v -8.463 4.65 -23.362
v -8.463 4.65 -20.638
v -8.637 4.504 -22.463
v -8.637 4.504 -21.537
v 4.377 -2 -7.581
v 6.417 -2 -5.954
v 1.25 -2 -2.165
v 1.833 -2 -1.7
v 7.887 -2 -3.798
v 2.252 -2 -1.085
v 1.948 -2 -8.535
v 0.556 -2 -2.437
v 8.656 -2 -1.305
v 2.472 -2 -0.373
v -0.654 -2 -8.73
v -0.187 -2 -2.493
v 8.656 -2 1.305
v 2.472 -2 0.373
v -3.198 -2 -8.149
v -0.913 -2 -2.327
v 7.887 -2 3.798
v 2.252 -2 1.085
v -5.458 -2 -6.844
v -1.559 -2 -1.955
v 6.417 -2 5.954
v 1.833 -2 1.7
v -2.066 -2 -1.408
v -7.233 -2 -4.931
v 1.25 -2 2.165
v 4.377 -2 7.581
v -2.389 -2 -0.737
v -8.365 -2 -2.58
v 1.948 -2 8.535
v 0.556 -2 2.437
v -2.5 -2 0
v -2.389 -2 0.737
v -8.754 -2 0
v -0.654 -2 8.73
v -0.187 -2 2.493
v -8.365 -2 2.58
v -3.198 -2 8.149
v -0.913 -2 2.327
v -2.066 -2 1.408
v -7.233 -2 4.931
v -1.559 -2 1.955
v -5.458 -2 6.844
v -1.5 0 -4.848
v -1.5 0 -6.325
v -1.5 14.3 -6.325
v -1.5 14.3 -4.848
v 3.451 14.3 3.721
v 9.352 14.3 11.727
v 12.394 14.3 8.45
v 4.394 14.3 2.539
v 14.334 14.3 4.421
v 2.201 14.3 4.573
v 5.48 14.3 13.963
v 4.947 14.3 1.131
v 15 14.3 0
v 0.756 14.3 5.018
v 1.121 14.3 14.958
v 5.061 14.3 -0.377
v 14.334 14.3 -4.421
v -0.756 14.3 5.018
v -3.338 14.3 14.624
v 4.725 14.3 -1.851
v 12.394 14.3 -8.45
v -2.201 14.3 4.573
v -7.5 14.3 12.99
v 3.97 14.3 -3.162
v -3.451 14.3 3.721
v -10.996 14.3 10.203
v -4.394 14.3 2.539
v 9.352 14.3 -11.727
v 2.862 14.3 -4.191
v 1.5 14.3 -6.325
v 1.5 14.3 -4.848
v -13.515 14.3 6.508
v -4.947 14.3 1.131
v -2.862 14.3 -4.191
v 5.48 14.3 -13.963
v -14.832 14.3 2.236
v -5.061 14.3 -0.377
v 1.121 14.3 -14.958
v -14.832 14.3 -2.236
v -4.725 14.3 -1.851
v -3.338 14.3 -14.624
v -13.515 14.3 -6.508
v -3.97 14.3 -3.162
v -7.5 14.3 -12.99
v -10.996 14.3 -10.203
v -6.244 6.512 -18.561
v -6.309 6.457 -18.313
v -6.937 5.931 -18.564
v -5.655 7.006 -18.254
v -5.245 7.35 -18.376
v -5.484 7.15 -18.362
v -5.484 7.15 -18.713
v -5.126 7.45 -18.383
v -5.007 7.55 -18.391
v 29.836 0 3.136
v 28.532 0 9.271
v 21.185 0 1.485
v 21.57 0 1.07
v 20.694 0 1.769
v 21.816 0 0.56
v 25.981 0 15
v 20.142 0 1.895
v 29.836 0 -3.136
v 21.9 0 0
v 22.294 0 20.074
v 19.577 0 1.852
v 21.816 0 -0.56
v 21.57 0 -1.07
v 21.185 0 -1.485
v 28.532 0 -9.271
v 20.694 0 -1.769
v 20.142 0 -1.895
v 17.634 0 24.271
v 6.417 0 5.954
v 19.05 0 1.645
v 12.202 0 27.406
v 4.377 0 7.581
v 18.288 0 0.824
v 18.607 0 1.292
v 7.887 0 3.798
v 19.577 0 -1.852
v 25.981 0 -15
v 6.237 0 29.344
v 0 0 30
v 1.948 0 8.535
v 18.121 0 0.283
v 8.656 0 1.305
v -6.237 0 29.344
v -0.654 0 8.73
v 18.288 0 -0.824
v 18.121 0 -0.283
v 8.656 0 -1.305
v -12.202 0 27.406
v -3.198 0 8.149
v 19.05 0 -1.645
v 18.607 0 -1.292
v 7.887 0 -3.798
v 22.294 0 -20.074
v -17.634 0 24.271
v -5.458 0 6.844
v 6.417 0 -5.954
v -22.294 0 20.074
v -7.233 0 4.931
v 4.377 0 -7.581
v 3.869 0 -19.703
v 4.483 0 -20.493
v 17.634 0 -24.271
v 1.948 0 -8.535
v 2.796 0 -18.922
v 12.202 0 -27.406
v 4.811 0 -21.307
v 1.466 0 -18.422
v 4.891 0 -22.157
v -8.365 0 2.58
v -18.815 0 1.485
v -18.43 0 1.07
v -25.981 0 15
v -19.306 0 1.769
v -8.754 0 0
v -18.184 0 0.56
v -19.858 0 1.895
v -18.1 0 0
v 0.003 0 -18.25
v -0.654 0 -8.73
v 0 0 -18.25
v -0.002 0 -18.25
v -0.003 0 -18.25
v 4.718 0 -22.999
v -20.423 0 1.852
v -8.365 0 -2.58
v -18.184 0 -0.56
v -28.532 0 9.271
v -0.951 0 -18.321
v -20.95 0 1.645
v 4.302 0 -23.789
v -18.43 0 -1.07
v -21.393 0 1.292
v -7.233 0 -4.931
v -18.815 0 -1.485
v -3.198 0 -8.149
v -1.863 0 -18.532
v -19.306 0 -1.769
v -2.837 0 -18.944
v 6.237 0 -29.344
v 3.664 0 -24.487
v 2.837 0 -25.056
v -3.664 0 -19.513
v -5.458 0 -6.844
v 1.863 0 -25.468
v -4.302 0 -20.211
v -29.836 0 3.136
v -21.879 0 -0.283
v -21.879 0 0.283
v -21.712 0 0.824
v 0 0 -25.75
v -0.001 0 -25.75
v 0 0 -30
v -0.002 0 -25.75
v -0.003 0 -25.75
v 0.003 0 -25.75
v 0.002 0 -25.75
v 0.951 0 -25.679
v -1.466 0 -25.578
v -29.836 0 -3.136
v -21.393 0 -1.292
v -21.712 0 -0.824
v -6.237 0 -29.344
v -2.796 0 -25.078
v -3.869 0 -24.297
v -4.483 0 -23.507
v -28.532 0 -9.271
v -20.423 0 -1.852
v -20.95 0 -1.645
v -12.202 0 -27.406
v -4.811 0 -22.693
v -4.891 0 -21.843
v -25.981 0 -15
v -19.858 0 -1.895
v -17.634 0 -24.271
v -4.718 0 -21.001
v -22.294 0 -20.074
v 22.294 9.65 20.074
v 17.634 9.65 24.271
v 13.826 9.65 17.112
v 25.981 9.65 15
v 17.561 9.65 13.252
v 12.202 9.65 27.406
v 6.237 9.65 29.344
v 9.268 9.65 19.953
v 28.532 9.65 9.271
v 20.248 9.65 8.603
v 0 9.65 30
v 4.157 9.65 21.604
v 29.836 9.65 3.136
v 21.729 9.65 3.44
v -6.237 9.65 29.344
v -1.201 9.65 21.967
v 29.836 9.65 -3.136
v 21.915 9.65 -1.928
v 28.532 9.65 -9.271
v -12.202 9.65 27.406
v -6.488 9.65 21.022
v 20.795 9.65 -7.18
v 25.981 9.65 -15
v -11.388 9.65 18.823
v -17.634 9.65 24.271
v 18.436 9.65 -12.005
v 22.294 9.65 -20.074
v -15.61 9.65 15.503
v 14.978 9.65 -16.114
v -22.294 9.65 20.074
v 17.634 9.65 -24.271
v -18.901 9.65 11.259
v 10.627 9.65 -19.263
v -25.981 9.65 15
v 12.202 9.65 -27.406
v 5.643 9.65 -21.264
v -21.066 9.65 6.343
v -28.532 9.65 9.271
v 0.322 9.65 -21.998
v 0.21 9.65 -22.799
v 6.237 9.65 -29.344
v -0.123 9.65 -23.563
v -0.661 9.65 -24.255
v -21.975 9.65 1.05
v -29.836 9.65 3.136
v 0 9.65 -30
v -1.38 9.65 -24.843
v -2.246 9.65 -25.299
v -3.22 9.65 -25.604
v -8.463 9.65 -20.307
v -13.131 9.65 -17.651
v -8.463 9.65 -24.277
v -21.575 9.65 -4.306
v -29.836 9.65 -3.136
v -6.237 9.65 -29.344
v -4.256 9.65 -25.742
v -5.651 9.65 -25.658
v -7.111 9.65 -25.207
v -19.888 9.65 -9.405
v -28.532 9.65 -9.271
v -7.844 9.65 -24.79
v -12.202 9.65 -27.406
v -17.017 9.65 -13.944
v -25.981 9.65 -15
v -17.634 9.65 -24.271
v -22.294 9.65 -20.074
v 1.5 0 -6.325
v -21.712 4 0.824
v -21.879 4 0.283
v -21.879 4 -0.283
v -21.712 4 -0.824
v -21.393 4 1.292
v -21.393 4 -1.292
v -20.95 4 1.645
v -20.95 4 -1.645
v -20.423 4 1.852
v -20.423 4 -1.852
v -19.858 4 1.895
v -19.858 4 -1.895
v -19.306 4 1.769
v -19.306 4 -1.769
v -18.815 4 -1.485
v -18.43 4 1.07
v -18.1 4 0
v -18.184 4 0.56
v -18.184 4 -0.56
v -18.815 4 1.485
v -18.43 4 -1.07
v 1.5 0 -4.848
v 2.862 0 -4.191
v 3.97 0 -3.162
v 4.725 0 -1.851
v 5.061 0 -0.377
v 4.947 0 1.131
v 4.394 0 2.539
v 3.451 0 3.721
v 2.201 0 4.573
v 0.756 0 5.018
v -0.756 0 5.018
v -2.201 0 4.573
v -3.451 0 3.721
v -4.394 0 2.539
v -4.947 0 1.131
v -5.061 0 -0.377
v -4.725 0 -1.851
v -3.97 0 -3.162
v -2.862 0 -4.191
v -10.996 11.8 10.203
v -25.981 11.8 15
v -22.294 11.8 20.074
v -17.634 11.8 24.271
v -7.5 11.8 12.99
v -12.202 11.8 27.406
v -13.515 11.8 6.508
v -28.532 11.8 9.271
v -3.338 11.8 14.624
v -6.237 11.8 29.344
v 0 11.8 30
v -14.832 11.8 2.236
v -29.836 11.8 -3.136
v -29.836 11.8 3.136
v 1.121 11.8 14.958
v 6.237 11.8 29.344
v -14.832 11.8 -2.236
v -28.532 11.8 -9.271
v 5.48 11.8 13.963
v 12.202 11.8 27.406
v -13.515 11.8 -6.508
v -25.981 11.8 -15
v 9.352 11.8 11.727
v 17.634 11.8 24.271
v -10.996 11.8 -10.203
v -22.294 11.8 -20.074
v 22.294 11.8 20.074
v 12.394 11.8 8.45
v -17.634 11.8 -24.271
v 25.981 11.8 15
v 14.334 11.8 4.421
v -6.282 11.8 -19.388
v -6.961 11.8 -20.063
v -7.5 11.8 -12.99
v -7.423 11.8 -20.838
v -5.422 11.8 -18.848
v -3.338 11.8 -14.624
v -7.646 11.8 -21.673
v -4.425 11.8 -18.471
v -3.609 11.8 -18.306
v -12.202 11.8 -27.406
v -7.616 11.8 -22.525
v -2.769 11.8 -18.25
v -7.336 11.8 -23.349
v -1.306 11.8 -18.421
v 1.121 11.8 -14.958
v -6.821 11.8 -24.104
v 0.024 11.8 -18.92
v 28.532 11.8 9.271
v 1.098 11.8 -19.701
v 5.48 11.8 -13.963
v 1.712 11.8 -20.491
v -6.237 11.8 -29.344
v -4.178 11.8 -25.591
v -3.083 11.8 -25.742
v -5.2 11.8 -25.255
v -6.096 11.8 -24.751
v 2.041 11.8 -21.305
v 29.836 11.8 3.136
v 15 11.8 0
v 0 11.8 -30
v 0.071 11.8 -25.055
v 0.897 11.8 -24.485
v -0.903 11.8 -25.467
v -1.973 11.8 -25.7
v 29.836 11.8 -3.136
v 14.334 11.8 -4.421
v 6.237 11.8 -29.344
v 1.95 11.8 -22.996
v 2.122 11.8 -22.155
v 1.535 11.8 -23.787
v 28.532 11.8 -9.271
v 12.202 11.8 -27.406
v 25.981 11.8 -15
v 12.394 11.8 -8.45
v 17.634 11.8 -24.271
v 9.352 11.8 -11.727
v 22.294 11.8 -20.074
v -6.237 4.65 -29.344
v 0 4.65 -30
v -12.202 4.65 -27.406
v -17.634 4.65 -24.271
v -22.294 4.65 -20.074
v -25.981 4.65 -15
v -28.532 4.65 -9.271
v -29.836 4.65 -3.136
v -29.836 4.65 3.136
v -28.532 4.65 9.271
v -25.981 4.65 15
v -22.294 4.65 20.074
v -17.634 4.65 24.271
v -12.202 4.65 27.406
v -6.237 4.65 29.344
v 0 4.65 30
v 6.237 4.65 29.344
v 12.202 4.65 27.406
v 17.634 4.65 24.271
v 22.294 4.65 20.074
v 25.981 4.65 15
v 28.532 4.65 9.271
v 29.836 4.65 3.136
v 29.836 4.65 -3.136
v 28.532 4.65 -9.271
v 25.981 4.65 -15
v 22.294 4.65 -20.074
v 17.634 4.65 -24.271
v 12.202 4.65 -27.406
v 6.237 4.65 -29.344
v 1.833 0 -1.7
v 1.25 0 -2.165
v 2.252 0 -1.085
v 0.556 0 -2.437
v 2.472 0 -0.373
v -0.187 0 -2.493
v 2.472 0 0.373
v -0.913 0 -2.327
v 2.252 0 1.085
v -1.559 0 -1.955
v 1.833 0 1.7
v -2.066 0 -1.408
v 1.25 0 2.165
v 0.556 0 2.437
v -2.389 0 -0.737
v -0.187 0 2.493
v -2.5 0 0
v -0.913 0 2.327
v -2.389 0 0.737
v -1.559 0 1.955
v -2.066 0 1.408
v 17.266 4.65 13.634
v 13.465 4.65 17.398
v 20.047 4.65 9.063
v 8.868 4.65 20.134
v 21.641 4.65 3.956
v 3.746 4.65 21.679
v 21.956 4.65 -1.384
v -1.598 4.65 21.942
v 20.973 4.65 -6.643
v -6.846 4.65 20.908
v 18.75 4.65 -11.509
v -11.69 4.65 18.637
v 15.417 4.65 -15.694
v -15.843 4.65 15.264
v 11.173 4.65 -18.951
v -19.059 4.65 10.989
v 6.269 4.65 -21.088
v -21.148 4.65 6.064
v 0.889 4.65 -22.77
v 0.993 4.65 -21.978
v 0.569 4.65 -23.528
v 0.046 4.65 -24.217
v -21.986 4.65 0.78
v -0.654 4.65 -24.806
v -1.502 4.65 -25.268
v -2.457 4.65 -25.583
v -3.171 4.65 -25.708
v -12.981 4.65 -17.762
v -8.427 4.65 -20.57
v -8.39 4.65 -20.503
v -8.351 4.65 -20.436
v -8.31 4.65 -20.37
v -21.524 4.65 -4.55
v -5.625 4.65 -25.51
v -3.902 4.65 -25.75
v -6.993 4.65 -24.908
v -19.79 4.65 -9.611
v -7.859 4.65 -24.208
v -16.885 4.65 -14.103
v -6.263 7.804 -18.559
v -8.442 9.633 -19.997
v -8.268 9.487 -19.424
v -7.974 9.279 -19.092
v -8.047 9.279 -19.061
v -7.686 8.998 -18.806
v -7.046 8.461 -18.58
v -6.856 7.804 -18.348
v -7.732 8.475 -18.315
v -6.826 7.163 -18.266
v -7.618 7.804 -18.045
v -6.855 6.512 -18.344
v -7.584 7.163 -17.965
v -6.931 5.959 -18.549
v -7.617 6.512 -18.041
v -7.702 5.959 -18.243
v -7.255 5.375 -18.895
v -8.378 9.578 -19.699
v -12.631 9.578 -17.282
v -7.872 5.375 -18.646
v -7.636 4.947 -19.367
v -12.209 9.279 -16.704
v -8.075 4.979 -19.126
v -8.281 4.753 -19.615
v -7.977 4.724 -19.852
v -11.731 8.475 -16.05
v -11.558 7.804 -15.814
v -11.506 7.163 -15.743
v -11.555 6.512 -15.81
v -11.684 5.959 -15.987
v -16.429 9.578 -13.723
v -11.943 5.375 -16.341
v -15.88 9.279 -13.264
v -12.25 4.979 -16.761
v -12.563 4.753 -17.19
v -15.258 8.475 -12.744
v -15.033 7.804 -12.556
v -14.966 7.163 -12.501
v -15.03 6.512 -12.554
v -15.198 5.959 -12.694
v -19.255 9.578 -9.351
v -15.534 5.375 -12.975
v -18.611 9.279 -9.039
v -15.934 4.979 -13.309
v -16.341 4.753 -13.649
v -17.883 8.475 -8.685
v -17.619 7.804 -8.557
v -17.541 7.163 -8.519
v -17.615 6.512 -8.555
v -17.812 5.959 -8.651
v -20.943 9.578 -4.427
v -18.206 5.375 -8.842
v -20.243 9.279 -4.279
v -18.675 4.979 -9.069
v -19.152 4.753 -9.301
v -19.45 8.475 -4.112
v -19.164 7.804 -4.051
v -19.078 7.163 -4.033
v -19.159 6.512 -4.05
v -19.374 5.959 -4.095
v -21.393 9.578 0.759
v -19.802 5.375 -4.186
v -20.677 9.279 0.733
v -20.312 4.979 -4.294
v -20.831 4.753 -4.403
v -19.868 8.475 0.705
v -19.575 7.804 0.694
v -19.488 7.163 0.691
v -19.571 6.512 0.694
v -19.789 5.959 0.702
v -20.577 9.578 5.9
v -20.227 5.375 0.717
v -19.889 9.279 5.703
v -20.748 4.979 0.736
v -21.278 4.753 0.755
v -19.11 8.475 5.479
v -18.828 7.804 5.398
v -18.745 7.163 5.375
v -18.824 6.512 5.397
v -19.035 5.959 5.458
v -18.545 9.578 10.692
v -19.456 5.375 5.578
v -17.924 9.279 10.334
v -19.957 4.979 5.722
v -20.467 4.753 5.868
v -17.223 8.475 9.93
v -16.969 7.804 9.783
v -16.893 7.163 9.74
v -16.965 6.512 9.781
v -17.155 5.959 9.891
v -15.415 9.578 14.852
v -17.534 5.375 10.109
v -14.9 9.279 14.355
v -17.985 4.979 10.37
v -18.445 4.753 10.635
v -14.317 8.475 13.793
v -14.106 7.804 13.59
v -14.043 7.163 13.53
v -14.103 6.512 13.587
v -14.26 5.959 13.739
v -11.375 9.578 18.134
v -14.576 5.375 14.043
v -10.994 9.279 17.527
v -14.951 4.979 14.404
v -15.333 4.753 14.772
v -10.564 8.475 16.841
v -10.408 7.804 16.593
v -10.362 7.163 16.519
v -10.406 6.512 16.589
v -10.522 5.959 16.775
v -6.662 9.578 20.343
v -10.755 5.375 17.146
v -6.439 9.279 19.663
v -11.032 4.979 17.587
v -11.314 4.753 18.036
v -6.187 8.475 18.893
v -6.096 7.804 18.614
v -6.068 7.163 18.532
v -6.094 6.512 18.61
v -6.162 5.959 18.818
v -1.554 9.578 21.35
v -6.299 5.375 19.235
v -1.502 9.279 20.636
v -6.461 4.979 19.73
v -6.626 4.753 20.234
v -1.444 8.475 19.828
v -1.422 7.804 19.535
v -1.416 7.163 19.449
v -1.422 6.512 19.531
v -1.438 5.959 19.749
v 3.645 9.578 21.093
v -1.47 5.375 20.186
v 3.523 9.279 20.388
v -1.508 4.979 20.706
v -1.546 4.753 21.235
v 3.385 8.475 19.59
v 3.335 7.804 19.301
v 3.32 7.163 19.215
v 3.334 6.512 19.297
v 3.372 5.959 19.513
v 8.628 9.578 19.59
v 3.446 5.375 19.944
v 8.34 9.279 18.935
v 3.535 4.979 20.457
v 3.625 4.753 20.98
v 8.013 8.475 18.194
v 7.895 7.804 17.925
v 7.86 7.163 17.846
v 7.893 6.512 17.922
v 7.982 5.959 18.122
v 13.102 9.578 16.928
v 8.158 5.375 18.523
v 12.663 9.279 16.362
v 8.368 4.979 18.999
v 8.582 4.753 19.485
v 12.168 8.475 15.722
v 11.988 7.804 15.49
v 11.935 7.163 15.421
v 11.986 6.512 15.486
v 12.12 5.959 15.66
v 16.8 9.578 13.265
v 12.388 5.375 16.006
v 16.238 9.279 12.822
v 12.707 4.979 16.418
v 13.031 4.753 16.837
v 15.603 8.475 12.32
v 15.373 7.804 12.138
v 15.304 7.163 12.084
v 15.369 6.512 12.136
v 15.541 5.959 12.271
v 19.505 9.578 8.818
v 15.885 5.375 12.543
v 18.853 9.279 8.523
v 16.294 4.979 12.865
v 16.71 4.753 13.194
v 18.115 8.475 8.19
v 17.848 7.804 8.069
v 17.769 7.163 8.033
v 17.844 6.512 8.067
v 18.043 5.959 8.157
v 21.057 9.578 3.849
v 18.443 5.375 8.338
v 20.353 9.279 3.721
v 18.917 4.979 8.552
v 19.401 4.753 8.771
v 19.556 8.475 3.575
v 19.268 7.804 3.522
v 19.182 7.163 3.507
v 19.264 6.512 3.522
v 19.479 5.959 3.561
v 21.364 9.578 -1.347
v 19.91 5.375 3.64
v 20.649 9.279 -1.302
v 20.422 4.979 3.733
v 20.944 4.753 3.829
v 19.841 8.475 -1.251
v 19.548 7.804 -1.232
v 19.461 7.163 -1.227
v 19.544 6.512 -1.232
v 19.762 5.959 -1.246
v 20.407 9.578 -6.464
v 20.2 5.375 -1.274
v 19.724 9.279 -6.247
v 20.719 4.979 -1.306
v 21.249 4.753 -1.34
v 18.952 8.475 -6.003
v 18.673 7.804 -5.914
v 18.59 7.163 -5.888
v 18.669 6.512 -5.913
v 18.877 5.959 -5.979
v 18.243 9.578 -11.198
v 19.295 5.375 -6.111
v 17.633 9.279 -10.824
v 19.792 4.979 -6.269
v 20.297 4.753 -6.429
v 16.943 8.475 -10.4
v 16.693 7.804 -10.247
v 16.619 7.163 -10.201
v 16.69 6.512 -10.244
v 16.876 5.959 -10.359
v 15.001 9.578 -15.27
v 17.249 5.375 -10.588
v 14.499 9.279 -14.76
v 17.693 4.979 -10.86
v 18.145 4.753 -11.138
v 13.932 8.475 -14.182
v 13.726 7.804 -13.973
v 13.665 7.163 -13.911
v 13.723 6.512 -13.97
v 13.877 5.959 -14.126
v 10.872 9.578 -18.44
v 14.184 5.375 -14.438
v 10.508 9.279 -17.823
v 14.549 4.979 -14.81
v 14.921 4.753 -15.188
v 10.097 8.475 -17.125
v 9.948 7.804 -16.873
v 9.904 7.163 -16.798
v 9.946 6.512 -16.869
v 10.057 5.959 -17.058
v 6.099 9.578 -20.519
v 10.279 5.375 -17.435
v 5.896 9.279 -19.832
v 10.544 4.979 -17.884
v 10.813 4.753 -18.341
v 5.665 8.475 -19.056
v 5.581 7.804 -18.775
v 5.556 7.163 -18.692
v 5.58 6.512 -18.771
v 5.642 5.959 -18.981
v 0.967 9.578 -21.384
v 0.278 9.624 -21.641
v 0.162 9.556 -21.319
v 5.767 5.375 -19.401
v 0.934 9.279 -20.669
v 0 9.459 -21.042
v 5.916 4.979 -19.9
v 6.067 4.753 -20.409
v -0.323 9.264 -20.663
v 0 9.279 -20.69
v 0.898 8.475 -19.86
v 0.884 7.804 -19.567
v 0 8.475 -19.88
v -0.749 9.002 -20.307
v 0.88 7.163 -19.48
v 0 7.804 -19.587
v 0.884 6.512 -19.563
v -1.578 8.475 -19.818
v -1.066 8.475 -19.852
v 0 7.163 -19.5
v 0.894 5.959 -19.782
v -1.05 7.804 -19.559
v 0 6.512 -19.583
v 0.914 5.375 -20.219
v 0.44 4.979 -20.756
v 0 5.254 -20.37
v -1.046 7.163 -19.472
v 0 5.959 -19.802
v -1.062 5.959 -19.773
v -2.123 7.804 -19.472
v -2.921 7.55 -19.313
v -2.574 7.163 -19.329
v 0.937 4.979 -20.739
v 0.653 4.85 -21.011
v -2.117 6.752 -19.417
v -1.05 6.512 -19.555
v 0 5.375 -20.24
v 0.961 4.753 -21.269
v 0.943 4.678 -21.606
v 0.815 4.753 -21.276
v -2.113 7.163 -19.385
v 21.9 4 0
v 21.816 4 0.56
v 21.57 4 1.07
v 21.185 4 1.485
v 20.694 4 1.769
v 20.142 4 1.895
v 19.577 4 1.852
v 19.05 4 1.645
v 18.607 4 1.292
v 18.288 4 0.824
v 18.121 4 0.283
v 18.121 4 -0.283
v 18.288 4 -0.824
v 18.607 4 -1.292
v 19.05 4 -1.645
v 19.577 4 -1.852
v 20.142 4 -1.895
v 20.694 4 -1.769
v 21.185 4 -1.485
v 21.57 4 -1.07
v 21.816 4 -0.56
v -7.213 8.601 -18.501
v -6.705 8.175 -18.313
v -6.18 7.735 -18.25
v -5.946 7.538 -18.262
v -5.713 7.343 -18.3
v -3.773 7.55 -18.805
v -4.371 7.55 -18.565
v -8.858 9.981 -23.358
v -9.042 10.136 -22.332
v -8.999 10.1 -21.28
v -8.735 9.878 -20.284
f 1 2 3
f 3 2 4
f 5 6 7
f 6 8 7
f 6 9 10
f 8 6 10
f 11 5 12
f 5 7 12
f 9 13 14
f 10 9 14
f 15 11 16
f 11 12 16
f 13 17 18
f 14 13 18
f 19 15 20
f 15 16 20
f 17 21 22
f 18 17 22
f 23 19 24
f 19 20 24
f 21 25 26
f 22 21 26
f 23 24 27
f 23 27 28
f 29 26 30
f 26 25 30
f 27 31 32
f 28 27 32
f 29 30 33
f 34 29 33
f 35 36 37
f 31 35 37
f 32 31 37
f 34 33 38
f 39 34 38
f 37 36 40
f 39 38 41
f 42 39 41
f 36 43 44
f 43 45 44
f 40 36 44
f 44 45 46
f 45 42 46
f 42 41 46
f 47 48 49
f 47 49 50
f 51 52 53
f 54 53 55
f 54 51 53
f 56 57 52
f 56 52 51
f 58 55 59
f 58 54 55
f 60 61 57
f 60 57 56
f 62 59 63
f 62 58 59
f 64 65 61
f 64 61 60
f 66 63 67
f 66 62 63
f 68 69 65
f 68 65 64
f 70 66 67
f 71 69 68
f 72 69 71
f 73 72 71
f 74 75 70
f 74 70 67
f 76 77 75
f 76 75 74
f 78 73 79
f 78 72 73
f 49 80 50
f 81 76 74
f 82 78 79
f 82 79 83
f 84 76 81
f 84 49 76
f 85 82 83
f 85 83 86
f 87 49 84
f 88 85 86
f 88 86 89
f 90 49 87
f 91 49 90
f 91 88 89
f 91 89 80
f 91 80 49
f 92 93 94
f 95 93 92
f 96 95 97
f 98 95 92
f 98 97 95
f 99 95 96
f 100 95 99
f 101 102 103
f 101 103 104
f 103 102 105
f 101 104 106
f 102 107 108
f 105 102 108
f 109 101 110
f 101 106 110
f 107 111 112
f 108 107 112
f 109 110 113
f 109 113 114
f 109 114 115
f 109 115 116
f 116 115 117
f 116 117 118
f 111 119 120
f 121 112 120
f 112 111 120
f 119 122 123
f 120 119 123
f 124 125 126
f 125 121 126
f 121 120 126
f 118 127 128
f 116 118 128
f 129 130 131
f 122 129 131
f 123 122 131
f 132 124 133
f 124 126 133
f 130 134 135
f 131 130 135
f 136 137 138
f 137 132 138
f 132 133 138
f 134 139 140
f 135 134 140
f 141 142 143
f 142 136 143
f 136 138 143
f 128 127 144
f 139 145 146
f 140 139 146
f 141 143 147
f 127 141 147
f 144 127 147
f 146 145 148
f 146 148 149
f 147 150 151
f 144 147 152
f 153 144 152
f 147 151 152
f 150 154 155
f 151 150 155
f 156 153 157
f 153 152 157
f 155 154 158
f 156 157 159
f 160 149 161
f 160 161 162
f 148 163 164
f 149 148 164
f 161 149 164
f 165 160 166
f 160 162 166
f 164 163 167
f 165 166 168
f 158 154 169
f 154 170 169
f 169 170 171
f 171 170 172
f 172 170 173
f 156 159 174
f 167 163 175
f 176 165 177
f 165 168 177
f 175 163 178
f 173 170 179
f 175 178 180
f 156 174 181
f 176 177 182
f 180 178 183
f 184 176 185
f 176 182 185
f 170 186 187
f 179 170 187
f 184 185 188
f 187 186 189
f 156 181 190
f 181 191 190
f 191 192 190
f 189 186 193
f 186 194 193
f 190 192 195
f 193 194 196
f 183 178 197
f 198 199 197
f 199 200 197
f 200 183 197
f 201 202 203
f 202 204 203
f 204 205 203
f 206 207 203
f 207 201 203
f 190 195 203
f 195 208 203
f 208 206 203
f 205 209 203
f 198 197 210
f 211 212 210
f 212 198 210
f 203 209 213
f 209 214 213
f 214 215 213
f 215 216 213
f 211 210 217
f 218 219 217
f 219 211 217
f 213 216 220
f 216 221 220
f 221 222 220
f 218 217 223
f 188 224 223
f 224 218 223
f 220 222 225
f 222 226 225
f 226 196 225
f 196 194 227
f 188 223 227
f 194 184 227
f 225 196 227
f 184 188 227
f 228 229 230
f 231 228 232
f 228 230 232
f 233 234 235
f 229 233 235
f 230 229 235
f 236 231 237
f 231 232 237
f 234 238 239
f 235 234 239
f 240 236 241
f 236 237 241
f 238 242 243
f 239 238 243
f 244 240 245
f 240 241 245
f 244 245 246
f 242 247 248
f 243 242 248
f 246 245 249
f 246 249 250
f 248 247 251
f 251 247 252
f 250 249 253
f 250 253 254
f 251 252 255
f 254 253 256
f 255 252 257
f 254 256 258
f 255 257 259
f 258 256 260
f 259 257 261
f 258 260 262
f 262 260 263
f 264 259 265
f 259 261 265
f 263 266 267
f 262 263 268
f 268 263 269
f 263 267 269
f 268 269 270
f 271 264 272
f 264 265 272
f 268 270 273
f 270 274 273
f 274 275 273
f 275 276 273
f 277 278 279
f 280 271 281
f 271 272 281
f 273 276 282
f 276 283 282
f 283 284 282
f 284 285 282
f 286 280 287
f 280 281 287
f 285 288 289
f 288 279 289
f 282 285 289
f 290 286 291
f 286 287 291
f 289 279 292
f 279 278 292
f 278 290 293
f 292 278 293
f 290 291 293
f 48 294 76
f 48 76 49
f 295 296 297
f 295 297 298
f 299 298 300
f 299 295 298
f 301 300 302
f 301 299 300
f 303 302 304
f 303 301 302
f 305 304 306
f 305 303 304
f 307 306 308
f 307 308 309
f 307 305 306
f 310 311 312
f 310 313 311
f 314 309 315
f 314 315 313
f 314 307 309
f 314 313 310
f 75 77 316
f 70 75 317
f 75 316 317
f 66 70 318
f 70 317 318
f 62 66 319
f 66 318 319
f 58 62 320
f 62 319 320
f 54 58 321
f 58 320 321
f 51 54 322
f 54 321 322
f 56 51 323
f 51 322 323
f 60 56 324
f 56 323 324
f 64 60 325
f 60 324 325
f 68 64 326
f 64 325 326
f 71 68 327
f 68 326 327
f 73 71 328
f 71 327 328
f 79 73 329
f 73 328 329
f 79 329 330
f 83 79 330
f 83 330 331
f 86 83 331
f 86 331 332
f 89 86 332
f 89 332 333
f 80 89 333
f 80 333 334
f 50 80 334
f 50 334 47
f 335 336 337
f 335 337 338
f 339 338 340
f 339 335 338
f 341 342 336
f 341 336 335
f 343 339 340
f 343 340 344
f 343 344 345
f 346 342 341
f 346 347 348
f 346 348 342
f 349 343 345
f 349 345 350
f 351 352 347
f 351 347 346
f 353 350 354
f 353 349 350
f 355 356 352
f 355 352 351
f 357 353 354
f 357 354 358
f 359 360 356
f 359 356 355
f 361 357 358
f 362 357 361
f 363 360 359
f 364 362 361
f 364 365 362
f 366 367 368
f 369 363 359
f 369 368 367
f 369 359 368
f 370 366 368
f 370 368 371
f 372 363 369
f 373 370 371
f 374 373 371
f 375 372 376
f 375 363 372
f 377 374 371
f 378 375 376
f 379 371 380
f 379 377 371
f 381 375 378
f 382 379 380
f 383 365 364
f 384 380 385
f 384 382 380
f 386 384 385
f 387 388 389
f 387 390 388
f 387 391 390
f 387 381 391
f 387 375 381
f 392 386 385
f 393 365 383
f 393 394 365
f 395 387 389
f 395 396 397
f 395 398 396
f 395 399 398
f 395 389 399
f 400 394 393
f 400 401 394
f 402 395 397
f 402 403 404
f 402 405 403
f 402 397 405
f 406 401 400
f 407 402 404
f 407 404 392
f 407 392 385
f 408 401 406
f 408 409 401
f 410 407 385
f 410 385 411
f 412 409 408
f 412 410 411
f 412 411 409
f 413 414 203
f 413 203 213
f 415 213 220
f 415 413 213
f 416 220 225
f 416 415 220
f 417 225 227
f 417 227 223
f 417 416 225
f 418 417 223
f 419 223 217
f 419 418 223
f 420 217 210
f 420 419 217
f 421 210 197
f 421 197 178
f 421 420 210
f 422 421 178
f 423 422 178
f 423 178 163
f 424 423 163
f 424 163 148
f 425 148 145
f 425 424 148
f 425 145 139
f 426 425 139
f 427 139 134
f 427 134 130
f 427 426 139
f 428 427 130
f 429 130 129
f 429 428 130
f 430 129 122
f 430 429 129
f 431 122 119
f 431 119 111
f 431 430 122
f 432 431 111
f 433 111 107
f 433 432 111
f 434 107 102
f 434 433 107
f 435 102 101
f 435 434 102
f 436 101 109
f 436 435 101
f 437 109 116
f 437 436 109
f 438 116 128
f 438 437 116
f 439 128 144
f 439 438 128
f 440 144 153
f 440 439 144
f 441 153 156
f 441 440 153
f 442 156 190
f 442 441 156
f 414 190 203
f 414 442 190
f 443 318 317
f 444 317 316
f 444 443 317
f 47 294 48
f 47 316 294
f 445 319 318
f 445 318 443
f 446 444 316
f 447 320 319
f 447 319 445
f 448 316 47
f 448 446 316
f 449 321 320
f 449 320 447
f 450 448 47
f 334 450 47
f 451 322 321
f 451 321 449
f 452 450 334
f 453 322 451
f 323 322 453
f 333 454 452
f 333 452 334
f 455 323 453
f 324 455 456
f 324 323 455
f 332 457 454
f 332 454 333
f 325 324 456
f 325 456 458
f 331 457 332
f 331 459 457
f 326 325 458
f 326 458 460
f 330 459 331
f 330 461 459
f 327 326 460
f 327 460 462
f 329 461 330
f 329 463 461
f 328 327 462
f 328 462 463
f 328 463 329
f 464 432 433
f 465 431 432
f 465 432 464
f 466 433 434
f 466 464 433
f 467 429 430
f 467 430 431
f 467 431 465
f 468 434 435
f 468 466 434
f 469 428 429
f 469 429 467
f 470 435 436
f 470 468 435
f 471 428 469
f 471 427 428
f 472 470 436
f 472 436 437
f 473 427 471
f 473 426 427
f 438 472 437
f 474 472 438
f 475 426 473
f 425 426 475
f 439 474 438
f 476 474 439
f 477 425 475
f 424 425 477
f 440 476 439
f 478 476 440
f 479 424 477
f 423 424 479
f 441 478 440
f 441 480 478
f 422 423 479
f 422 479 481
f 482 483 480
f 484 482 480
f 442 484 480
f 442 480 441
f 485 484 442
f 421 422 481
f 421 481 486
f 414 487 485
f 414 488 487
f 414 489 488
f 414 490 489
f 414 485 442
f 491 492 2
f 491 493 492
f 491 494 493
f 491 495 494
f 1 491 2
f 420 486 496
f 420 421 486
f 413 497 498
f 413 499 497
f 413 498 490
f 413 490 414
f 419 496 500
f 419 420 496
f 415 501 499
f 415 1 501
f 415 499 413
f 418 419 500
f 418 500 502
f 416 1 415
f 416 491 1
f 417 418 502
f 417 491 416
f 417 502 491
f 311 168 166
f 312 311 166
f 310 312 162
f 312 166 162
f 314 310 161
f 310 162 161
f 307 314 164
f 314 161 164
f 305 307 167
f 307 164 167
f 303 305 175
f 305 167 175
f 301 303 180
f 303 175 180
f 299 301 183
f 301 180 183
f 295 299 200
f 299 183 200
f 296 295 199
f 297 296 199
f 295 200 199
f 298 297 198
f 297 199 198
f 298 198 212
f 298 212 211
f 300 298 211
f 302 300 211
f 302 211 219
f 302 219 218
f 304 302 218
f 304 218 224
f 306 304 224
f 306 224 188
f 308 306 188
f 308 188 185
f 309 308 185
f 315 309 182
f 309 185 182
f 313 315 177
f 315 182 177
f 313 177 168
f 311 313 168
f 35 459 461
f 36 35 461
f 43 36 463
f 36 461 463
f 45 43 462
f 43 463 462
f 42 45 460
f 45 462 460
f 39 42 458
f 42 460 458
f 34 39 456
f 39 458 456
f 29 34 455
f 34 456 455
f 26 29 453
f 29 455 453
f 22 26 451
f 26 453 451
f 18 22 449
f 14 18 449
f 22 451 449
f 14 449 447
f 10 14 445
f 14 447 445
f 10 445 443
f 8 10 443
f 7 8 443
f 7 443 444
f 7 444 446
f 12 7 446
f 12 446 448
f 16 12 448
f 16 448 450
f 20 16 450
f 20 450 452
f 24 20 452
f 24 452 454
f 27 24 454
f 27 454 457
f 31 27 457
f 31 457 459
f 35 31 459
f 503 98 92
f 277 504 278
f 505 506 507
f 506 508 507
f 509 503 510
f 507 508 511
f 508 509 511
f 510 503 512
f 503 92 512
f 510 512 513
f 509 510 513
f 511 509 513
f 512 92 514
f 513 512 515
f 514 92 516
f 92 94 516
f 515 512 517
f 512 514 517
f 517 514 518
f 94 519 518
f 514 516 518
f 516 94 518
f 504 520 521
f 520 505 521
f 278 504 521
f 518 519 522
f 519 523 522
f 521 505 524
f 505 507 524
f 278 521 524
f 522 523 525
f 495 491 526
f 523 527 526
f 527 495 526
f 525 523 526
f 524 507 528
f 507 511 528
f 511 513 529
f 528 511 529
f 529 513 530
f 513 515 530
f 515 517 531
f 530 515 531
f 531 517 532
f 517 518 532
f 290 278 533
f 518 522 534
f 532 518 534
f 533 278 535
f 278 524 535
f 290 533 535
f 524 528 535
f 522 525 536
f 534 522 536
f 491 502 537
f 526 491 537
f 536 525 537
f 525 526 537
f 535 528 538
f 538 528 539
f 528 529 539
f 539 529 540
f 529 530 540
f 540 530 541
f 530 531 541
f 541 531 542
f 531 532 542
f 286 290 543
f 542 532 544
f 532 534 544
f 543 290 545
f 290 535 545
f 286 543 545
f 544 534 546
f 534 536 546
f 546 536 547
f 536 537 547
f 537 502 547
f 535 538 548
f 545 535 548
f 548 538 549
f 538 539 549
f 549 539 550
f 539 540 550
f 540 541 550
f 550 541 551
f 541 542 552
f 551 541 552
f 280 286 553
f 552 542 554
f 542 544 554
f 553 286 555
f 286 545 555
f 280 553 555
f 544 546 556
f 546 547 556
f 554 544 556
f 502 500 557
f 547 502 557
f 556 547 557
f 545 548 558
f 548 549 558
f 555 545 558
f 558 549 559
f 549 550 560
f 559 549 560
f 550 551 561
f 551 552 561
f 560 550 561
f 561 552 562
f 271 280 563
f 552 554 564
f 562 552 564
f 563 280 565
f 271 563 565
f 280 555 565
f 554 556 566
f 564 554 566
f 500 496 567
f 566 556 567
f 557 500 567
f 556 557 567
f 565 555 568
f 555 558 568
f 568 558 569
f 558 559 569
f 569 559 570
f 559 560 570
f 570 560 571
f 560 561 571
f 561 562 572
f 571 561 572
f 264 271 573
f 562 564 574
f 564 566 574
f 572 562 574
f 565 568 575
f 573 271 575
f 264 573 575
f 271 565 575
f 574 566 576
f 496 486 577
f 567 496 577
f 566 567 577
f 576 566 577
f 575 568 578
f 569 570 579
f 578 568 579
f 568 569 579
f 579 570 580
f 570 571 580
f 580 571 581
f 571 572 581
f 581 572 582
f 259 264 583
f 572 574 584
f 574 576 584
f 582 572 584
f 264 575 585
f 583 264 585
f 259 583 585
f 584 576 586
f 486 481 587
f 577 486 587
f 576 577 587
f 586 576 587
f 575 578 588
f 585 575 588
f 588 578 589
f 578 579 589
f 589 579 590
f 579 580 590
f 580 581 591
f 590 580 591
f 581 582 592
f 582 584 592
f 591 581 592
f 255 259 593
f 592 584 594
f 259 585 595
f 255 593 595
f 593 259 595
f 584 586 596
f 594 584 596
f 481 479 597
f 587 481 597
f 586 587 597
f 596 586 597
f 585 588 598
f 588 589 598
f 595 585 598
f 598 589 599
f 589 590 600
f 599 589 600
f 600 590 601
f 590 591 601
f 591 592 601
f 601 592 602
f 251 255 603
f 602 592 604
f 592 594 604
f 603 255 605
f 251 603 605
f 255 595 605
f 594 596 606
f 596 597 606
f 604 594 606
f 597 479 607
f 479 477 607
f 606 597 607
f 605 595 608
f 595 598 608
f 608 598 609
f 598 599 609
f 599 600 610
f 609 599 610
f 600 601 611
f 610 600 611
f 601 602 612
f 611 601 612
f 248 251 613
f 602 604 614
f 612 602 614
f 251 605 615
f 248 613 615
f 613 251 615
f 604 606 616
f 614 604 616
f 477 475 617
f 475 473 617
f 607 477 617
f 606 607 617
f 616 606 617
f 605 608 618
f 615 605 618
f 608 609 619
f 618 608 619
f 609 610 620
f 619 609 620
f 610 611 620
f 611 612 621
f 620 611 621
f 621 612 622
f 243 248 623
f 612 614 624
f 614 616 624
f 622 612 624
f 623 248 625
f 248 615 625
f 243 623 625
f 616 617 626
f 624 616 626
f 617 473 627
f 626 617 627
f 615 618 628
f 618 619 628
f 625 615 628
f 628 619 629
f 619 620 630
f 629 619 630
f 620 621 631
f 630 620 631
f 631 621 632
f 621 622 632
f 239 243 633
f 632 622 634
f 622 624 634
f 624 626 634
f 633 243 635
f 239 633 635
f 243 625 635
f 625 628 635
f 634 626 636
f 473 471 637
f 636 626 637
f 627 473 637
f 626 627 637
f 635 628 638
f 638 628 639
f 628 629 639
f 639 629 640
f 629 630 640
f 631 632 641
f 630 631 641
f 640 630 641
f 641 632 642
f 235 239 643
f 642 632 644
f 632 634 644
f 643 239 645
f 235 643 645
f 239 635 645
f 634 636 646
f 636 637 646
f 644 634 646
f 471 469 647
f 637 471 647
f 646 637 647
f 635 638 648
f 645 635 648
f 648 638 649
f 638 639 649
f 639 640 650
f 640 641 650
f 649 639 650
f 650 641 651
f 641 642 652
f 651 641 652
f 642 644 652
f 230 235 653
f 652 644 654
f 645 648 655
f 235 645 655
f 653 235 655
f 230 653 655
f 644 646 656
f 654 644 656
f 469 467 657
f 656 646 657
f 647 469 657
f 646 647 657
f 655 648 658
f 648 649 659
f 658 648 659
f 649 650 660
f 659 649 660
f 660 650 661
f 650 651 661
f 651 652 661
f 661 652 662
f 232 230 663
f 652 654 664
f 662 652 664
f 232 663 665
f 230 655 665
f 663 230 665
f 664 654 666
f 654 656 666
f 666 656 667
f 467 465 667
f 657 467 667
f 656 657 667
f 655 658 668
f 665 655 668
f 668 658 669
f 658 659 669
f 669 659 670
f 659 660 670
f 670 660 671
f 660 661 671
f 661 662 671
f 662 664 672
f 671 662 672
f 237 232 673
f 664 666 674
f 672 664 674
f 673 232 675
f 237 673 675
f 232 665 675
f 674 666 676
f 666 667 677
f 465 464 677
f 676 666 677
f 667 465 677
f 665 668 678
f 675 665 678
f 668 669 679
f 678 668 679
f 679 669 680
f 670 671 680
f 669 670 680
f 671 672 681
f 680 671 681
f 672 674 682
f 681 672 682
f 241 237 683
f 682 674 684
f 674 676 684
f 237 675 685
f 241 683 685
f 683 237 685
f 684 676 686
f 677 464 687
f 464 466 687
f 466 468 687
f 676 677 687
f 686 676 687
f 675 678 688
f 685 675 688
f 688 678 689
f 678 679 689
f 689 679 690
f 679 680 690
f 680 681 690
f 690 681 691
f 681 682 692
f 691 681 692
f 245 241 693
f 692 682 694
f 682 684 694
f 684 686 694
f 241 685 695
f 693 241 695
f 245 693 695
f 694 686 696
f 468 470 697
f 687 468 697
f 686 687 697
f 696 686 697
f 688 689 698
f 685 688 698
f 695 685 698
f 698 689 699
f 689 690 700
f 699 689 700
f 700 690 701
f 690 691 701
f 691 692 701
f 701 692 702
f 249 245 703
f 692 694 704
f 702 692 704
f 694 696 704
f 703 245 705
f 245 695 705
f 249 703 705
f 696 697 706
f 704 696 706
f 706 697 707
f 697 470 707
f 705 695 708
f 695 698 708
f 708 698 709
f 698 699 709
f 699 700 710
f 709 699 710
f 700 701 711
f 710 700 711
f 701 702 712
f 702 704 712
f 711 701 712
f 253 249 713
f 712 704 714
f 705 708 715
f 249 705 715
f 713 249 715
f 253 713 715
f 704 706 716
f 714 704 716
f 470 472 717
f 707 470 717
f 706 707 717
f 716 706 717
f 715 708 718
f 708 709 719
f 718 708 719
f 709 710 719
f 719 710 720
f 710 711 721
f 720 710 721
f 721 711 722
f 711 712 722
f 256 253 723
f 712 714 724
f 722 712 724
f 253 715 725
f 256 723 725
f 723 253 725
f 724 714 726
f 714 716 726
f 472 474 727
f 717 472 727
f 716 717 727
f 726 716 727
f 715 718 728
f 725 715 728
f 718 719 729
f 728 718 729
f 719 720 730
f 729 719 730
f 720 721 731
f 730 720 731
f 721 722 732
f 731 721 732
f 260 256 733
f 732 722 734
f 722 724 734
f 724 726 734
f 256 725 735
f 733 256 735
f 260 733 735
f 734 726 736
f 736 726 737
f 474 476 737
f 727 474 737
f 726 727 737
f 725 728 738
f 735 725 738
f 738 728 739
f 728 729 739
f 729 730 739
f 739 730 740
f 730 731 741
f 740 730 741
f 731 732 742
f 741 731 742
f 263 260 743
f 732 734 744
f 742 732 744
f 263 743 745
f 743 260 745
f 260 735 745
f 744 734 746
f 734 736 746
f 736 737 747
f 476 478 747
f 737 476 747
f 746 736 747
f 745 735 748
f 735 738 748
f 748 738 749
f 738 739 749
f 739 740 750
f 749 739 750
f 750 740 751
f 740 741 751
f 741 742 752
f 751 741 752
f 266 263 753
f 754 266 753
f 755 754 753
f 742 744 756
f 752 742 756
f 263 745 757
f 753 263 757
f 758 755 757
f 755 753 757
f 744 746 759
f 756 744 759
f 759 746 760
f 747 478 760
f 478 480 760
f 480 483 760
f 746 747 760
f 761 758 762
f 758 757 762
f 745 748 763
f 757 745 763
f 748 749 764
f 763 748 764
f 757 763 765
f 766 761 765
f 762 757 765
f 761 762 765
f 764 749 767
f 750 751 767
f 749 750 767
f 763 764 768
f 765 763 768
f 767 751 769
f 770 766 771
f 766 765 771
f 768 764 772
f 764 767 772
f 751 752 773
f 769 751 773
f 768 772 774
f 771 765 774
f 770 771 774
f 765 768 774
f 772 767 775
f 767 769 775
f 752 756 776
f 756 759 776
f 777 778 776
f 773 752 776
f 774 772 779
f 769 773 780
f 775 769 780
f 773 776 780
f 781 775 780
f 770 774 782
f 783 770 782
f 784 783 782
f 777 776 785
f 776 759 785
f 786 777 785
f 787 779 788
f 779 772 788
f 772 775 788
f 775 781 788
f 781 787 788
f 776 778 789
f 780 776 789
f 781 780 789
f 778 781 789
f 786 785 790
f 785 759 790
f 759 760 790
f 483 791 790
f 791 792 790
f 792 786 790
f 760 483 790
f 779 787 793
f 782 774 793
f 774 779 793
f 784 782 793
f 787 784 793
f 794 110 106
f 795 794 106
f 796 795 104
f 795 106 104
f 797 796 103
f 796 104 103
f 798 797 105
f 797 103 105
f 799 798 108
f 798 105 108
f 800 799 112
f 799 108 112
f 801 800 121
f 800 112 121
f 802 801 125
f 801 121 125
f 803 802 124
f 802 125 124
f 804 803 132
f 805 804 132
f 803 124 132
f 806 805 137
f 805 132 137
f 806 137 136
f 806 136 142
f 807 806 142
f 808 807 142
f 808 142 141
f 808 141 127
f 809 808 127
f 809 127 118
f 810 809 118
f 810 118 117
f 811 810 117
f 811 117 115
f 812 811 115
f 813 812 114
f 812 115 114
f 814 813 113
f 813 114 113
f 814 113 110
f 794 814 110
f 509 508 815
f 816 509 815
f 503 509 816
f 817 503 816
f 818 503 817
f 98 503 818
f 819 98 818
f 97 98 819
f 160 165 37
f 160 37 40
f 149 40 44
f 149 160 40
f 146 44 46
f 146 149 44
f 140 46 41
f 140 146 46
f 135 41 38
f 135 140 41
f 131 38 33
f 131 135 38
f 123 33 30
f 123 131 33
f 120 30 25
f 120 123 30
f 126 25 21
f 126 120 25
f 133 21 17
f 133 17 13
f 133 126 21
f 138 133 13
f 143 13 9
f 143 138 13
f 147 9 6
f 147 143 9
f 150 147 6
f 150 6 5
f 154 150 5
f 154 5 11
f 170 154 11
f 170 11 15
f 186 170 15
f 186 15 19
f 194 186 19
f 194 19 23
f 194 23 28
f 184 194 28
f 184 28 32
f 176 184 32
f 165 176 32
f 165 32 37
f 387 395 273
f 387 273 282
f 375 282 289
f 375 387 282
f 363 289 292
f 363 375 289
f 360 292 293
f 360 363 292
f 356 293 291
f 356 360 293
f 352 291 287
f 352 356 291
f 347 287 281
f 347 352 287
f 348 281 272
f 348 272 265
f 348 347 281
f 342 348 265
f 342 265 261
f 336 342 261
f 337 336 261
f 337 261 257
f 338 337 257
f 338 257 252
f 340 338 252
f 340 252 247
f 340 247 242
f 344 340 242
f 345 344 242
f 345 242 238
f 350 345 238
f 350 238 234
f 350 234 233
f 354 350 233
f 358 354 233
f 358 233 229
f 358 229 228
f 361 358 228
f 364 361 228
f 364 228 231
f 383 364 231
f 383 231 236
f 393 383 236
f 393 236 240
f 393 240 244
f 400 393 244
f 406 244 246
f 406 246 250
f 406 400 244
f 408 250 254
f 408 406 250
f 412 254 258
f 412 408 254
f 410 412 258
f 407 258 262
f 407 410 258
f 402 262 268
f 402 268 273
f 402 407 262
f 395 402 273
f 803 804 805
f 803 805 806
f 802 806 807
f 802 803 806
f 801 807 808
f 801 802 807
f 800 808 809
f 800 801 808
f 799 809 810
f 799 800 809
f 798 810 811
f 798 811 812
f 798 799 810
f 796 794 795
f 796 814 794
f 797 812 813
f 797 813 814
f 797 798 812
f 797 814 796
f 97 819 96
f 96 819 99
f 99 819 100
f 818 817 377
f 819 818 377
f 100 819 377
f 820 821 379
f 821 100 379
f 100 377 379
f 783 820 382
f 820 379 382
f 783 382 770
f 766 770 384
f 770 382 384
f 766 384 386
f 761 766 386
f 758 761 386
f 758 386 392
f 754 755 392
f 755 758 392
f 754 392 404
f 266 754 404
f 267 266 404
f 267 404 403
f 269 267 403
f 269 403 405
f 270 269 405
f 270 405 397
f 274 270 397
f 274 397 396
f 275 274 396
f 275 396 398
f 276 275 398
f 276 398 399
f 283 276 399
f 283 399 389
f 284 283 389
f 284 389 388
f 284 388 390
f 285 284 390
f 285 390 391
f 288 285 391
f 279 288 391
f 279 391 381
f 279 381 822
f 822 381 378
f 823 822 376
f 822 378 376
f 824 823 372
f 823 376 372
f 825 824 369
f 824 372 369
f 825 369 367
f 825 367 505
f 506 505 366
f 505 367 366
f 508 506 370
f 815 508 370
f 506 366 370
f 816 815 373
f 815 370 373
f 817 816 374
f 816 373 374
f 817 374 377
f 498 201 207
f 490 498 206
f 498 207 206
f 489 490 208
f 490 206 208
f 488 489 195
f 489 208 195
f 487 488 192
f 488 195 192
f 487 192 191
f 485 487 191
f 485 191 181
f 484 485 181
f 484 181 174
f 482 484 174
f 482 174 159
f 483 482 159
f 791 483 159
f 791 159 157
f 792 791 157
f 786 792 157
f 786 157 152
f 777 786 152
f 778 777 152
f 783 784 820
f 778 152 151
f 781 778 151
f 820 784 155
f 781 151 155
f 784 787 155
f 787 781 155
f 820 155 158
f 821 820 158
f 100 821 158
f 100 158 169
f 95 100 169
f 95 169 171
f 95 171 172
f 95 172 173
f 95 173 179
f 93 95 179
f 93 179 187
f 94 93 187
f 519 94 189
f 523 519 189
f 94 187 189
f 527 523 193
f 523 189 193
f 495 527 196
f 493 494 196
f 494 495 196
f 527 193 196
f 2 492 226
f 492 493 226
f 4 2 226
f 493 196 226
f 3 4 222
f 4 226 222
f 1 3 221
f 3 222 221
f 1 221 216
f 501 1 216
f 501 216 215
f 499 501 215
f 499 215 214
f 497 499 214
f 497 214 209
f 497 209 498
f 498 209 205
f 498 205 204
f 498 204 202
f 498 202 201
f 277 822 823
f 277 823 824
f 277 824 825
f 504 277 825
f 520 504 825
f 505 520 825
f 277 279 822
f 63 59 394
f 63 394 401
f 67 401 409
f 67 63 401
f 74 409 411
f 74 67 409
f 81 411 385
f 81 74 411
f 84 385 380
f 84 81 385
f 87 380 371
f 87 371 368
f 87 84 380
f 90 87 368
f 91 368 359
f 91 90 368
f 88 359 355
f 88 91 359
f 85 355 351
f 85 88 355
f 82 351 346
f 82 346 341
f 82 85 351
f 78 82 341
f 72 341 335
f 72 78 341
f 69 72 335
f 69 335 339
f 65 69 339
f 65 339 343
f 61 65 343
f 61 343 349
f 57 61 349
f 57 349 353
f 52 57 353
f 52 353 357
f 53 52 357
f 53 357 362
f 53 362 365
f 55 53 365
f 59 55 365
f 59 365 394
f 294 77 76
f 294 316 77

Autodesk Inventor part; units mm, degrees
ref_plane "YZ Plane" through (0, 0, 0) normal (1, 0, 0) x (0, 1, 0)
sketch "Sketch1" plane through (0, 0, 0) normal (0, 1, 0) x (-1, 0, 0)
  circle A0 centre (0, 0) radius 5.075
  circle A1 centre (0, 0) radius 20
  line L0 (1.5, -3.825) -> (-1.5, -3.825)
  line L1 (-1.5, -3.825) -> (-1.5, -6.325)
  line L2 (-1.5, -6.325) -> (1.5, -6.325)
  line L3 (1.5, -6.325) -> (1.5, -3.825)
  line L4 (1.5, -3.825) -> (-1.5, -6.325) construction
  line L5 (-1.5, -3.825) -> (1.5, -6.325) construction
  circle A2 centre (0, 0) radius 2.5
  circle A3 centre (0, 0) radius 8.754
  point P0 (0, -5.075)
  point P1 (-1.5, -4.8483)
  point P2 (1.5, -4.8483)
  dimension "d0" = 10.15
  dimension "d1" = 40
  dimension "d2" = 1.25
  dimension "d3" = 3
  dimension "d17" = 5
extrude "Extrusion1" add sketch "Sketch1" along normal blind 14.3 contours A1 | A3
sketch "Sketch2" plane through (0, 0, 0) normal (1, 0, 0) x (0, 1, 0)
  line L0 (0, 0) -> (14.3, 0)
  line L1 (14.3, 0) -> (14.3, -22)
  line L2 (14.3, -22) -> (0, -22) construction
  line L3 (0, -22) -> (0, 0)
  line L4 (0, -22) -> (14.3, -22) construction
  line L5 (14.3, -22) -> (14.3, -20.0661)
  line L6 (0, -20) -> (14.3, -20) projected
  circle A0 centre (7.15, -22) radius 2.5
  line L7 (9.65, -22) -> (4.65, -22)
  line L8 (4.65, -22) -> (4.65, -30)
  line L9 (4.65, -30) -> (9.65, -30)
  line L10 (9.65, -30) -> (9.65, -22)
  line L11 (14.3, -20) -> (0, -20)
  line L12 (0, -20) -> (0, -30)
  line L13 (0, -30) -> (14.3, -30)
  line L14 (14.3, -30) -> (14.3, -20)
  point P0 (4.65, -30)
  point P1 (5.65, -20)
  point P2 (14.3, -22)
  point P3 (14.3, -20)
  point P4 (8.65, -20)
  point P5 (9.65, -30)
  point P6 (14.3, -20)
  point P7 (8.65, -20)
  dimension "d22" = 5
  dimension "d7" = 22
  dimension "d10" = 14.3
  dimension "d23" = 8
  dimension "d31" = 10
  dimension "d41" = 14.3
  dimension "d42" = 5
  dimension "d56" = 30
revolve "Revolution1" add sketch "Sketch2" angle 360 about axis through (0, 0, 0) along (0, 1, 0) contours L0 L1 L6 A0 L3 | L6 A0 L8 L13 L12 L3 | L1 L14 L13 L10 A0 L6 | A0 L6
extrude "Extrusion3" add sketch "Sketch1" against normal blind 2 contours A0 L3 L0 L1 | L1 L0 L3 A0 | A0 L3 L2 L1 | A3
revolve "Revolution4" cut sketch "Sketch2" angle 360 about axis through (0, 0, 0) along (0, 1, 0) contours A0 L6
sketch "Sketch3" plane through (0, 0, 0) normal (0, -1, 0) x (1, 0, 0)
  line L0 (0, 0) -> (0, -22)
  dimension "d25" = 22
ref_plane "Work Plane1" through (0, 0, 0) normal (0.6427876, -0.7660444, 0) x (0, 0, -1)
sketch "Sketch4" plane through (0, 0, 0) normal (0.6427876, -0.7660444, 0) x (0, 0, -1)
  ellipse E0 centre (0, 2.7318) end of major axis (22, 2.7318) minor radius 16.853 projected
  line L0 (0, 0) -> (22, 0)
  circle A0 centre (22, 0) radius 3.75
  dimension "d27" = 22
  dimension "d28" = 7.5
extrude "Extrusion4" cut sketch "Sketch4" against normal blind 9 contours E0 L0 A0 | E0 A0 | E0 A0 L0 picked at (24.3646, -0.3075)
extrude "Extrusion5" cut sketch "Sketch4" along normal blind 7 contours E0 L0 A0 | E0 A0 | E0 A0 L0 picked at (24.3646, -0.3075)
ref_plane "Work Plane2" through (0, 14.3, -22) normal (0.6427876, 0.7660444, 0) x (0, 0, 1)
sketch "Sketch5" plane through (0, 14.3, -22) normal (0.6427876, 0.7660444, 0) x (0, 0, 1)
  ellipse E0 centre (22, -0.5142) end of major axis (27.075, -0.5142) minor radius 3.8877 (17.1517, -1.6633) -> (17.1517, 0.6348) ccw projected
  line L0 (22, -0.5142) -> (0, -0.5142)
  circle A0 centre (0, -0.5142) radius 3.75
  point P0 (22, 9.1919)
  dimension "d35" = 22
  dimension "d36" = 7.5
extrude "Extrusion6" cut sketch "Sketch5" against normal blind 9
extrude "Extrusion7" cut sketch "Sketch5" along normal blind 8
extrude "Extrusion8" cut sketch "Sketch1" along normal through all contours A0 L3 L0 L1 | L1 L0 L3 A0 | A0 L3 L2 L1 | A2
sketch "Sketch6" plane through (0, 14.3, 0) normal (0, 1, 0) x (1, 0, 0)
  circle A0 centre (0, 0) radius 15
  circle A1 centre (0, 0) radius 35.6972
  dimension "d45" = 30
extrude "Extrusion9" cut sketch "Sketch6" against normal blind 2.5
sketch "Sketch7" plane through (0, 0, 0) normal (0, -1, 0) x (1, 0, 0)
  circle A0 centre (0, 0) radius 2.5 projected
  circle A1 centre (0, 0) radius 20
  line L0 (24, -7.5) -> (-24, -7.5)
  line L1 (-24, -7.5) -> (-24, 7.5)
  line L2 (-24, 7.5) -> (24, 7.5)
  line L3 (24, 7.5) -> (24, -7.5)
  line L4 (24, -7.5) -> (-24, 7.5) construction
  line L5 (-24, -7.5) -> (24, 7.5) construction
  circle A2 centre (0, 0) radius 11
  circle A3 centre (20, 0) radius 1.9
  circle A4 centre (-20, 0) radius 1.9
  dimension "d48" = 40
  dimension "d49" = 48
  dimension "d50" = 15
  dimension "d51" = 22
  dimension "d52" = 3.8
  dimension "d53" = 3.8
extrude "Extrusion10" cut sketch "Sketch7" against normal blind 4 contours A1 A3 | A1 A3 | A4 A1 | A1 A4
properties part number "spool_temp"
